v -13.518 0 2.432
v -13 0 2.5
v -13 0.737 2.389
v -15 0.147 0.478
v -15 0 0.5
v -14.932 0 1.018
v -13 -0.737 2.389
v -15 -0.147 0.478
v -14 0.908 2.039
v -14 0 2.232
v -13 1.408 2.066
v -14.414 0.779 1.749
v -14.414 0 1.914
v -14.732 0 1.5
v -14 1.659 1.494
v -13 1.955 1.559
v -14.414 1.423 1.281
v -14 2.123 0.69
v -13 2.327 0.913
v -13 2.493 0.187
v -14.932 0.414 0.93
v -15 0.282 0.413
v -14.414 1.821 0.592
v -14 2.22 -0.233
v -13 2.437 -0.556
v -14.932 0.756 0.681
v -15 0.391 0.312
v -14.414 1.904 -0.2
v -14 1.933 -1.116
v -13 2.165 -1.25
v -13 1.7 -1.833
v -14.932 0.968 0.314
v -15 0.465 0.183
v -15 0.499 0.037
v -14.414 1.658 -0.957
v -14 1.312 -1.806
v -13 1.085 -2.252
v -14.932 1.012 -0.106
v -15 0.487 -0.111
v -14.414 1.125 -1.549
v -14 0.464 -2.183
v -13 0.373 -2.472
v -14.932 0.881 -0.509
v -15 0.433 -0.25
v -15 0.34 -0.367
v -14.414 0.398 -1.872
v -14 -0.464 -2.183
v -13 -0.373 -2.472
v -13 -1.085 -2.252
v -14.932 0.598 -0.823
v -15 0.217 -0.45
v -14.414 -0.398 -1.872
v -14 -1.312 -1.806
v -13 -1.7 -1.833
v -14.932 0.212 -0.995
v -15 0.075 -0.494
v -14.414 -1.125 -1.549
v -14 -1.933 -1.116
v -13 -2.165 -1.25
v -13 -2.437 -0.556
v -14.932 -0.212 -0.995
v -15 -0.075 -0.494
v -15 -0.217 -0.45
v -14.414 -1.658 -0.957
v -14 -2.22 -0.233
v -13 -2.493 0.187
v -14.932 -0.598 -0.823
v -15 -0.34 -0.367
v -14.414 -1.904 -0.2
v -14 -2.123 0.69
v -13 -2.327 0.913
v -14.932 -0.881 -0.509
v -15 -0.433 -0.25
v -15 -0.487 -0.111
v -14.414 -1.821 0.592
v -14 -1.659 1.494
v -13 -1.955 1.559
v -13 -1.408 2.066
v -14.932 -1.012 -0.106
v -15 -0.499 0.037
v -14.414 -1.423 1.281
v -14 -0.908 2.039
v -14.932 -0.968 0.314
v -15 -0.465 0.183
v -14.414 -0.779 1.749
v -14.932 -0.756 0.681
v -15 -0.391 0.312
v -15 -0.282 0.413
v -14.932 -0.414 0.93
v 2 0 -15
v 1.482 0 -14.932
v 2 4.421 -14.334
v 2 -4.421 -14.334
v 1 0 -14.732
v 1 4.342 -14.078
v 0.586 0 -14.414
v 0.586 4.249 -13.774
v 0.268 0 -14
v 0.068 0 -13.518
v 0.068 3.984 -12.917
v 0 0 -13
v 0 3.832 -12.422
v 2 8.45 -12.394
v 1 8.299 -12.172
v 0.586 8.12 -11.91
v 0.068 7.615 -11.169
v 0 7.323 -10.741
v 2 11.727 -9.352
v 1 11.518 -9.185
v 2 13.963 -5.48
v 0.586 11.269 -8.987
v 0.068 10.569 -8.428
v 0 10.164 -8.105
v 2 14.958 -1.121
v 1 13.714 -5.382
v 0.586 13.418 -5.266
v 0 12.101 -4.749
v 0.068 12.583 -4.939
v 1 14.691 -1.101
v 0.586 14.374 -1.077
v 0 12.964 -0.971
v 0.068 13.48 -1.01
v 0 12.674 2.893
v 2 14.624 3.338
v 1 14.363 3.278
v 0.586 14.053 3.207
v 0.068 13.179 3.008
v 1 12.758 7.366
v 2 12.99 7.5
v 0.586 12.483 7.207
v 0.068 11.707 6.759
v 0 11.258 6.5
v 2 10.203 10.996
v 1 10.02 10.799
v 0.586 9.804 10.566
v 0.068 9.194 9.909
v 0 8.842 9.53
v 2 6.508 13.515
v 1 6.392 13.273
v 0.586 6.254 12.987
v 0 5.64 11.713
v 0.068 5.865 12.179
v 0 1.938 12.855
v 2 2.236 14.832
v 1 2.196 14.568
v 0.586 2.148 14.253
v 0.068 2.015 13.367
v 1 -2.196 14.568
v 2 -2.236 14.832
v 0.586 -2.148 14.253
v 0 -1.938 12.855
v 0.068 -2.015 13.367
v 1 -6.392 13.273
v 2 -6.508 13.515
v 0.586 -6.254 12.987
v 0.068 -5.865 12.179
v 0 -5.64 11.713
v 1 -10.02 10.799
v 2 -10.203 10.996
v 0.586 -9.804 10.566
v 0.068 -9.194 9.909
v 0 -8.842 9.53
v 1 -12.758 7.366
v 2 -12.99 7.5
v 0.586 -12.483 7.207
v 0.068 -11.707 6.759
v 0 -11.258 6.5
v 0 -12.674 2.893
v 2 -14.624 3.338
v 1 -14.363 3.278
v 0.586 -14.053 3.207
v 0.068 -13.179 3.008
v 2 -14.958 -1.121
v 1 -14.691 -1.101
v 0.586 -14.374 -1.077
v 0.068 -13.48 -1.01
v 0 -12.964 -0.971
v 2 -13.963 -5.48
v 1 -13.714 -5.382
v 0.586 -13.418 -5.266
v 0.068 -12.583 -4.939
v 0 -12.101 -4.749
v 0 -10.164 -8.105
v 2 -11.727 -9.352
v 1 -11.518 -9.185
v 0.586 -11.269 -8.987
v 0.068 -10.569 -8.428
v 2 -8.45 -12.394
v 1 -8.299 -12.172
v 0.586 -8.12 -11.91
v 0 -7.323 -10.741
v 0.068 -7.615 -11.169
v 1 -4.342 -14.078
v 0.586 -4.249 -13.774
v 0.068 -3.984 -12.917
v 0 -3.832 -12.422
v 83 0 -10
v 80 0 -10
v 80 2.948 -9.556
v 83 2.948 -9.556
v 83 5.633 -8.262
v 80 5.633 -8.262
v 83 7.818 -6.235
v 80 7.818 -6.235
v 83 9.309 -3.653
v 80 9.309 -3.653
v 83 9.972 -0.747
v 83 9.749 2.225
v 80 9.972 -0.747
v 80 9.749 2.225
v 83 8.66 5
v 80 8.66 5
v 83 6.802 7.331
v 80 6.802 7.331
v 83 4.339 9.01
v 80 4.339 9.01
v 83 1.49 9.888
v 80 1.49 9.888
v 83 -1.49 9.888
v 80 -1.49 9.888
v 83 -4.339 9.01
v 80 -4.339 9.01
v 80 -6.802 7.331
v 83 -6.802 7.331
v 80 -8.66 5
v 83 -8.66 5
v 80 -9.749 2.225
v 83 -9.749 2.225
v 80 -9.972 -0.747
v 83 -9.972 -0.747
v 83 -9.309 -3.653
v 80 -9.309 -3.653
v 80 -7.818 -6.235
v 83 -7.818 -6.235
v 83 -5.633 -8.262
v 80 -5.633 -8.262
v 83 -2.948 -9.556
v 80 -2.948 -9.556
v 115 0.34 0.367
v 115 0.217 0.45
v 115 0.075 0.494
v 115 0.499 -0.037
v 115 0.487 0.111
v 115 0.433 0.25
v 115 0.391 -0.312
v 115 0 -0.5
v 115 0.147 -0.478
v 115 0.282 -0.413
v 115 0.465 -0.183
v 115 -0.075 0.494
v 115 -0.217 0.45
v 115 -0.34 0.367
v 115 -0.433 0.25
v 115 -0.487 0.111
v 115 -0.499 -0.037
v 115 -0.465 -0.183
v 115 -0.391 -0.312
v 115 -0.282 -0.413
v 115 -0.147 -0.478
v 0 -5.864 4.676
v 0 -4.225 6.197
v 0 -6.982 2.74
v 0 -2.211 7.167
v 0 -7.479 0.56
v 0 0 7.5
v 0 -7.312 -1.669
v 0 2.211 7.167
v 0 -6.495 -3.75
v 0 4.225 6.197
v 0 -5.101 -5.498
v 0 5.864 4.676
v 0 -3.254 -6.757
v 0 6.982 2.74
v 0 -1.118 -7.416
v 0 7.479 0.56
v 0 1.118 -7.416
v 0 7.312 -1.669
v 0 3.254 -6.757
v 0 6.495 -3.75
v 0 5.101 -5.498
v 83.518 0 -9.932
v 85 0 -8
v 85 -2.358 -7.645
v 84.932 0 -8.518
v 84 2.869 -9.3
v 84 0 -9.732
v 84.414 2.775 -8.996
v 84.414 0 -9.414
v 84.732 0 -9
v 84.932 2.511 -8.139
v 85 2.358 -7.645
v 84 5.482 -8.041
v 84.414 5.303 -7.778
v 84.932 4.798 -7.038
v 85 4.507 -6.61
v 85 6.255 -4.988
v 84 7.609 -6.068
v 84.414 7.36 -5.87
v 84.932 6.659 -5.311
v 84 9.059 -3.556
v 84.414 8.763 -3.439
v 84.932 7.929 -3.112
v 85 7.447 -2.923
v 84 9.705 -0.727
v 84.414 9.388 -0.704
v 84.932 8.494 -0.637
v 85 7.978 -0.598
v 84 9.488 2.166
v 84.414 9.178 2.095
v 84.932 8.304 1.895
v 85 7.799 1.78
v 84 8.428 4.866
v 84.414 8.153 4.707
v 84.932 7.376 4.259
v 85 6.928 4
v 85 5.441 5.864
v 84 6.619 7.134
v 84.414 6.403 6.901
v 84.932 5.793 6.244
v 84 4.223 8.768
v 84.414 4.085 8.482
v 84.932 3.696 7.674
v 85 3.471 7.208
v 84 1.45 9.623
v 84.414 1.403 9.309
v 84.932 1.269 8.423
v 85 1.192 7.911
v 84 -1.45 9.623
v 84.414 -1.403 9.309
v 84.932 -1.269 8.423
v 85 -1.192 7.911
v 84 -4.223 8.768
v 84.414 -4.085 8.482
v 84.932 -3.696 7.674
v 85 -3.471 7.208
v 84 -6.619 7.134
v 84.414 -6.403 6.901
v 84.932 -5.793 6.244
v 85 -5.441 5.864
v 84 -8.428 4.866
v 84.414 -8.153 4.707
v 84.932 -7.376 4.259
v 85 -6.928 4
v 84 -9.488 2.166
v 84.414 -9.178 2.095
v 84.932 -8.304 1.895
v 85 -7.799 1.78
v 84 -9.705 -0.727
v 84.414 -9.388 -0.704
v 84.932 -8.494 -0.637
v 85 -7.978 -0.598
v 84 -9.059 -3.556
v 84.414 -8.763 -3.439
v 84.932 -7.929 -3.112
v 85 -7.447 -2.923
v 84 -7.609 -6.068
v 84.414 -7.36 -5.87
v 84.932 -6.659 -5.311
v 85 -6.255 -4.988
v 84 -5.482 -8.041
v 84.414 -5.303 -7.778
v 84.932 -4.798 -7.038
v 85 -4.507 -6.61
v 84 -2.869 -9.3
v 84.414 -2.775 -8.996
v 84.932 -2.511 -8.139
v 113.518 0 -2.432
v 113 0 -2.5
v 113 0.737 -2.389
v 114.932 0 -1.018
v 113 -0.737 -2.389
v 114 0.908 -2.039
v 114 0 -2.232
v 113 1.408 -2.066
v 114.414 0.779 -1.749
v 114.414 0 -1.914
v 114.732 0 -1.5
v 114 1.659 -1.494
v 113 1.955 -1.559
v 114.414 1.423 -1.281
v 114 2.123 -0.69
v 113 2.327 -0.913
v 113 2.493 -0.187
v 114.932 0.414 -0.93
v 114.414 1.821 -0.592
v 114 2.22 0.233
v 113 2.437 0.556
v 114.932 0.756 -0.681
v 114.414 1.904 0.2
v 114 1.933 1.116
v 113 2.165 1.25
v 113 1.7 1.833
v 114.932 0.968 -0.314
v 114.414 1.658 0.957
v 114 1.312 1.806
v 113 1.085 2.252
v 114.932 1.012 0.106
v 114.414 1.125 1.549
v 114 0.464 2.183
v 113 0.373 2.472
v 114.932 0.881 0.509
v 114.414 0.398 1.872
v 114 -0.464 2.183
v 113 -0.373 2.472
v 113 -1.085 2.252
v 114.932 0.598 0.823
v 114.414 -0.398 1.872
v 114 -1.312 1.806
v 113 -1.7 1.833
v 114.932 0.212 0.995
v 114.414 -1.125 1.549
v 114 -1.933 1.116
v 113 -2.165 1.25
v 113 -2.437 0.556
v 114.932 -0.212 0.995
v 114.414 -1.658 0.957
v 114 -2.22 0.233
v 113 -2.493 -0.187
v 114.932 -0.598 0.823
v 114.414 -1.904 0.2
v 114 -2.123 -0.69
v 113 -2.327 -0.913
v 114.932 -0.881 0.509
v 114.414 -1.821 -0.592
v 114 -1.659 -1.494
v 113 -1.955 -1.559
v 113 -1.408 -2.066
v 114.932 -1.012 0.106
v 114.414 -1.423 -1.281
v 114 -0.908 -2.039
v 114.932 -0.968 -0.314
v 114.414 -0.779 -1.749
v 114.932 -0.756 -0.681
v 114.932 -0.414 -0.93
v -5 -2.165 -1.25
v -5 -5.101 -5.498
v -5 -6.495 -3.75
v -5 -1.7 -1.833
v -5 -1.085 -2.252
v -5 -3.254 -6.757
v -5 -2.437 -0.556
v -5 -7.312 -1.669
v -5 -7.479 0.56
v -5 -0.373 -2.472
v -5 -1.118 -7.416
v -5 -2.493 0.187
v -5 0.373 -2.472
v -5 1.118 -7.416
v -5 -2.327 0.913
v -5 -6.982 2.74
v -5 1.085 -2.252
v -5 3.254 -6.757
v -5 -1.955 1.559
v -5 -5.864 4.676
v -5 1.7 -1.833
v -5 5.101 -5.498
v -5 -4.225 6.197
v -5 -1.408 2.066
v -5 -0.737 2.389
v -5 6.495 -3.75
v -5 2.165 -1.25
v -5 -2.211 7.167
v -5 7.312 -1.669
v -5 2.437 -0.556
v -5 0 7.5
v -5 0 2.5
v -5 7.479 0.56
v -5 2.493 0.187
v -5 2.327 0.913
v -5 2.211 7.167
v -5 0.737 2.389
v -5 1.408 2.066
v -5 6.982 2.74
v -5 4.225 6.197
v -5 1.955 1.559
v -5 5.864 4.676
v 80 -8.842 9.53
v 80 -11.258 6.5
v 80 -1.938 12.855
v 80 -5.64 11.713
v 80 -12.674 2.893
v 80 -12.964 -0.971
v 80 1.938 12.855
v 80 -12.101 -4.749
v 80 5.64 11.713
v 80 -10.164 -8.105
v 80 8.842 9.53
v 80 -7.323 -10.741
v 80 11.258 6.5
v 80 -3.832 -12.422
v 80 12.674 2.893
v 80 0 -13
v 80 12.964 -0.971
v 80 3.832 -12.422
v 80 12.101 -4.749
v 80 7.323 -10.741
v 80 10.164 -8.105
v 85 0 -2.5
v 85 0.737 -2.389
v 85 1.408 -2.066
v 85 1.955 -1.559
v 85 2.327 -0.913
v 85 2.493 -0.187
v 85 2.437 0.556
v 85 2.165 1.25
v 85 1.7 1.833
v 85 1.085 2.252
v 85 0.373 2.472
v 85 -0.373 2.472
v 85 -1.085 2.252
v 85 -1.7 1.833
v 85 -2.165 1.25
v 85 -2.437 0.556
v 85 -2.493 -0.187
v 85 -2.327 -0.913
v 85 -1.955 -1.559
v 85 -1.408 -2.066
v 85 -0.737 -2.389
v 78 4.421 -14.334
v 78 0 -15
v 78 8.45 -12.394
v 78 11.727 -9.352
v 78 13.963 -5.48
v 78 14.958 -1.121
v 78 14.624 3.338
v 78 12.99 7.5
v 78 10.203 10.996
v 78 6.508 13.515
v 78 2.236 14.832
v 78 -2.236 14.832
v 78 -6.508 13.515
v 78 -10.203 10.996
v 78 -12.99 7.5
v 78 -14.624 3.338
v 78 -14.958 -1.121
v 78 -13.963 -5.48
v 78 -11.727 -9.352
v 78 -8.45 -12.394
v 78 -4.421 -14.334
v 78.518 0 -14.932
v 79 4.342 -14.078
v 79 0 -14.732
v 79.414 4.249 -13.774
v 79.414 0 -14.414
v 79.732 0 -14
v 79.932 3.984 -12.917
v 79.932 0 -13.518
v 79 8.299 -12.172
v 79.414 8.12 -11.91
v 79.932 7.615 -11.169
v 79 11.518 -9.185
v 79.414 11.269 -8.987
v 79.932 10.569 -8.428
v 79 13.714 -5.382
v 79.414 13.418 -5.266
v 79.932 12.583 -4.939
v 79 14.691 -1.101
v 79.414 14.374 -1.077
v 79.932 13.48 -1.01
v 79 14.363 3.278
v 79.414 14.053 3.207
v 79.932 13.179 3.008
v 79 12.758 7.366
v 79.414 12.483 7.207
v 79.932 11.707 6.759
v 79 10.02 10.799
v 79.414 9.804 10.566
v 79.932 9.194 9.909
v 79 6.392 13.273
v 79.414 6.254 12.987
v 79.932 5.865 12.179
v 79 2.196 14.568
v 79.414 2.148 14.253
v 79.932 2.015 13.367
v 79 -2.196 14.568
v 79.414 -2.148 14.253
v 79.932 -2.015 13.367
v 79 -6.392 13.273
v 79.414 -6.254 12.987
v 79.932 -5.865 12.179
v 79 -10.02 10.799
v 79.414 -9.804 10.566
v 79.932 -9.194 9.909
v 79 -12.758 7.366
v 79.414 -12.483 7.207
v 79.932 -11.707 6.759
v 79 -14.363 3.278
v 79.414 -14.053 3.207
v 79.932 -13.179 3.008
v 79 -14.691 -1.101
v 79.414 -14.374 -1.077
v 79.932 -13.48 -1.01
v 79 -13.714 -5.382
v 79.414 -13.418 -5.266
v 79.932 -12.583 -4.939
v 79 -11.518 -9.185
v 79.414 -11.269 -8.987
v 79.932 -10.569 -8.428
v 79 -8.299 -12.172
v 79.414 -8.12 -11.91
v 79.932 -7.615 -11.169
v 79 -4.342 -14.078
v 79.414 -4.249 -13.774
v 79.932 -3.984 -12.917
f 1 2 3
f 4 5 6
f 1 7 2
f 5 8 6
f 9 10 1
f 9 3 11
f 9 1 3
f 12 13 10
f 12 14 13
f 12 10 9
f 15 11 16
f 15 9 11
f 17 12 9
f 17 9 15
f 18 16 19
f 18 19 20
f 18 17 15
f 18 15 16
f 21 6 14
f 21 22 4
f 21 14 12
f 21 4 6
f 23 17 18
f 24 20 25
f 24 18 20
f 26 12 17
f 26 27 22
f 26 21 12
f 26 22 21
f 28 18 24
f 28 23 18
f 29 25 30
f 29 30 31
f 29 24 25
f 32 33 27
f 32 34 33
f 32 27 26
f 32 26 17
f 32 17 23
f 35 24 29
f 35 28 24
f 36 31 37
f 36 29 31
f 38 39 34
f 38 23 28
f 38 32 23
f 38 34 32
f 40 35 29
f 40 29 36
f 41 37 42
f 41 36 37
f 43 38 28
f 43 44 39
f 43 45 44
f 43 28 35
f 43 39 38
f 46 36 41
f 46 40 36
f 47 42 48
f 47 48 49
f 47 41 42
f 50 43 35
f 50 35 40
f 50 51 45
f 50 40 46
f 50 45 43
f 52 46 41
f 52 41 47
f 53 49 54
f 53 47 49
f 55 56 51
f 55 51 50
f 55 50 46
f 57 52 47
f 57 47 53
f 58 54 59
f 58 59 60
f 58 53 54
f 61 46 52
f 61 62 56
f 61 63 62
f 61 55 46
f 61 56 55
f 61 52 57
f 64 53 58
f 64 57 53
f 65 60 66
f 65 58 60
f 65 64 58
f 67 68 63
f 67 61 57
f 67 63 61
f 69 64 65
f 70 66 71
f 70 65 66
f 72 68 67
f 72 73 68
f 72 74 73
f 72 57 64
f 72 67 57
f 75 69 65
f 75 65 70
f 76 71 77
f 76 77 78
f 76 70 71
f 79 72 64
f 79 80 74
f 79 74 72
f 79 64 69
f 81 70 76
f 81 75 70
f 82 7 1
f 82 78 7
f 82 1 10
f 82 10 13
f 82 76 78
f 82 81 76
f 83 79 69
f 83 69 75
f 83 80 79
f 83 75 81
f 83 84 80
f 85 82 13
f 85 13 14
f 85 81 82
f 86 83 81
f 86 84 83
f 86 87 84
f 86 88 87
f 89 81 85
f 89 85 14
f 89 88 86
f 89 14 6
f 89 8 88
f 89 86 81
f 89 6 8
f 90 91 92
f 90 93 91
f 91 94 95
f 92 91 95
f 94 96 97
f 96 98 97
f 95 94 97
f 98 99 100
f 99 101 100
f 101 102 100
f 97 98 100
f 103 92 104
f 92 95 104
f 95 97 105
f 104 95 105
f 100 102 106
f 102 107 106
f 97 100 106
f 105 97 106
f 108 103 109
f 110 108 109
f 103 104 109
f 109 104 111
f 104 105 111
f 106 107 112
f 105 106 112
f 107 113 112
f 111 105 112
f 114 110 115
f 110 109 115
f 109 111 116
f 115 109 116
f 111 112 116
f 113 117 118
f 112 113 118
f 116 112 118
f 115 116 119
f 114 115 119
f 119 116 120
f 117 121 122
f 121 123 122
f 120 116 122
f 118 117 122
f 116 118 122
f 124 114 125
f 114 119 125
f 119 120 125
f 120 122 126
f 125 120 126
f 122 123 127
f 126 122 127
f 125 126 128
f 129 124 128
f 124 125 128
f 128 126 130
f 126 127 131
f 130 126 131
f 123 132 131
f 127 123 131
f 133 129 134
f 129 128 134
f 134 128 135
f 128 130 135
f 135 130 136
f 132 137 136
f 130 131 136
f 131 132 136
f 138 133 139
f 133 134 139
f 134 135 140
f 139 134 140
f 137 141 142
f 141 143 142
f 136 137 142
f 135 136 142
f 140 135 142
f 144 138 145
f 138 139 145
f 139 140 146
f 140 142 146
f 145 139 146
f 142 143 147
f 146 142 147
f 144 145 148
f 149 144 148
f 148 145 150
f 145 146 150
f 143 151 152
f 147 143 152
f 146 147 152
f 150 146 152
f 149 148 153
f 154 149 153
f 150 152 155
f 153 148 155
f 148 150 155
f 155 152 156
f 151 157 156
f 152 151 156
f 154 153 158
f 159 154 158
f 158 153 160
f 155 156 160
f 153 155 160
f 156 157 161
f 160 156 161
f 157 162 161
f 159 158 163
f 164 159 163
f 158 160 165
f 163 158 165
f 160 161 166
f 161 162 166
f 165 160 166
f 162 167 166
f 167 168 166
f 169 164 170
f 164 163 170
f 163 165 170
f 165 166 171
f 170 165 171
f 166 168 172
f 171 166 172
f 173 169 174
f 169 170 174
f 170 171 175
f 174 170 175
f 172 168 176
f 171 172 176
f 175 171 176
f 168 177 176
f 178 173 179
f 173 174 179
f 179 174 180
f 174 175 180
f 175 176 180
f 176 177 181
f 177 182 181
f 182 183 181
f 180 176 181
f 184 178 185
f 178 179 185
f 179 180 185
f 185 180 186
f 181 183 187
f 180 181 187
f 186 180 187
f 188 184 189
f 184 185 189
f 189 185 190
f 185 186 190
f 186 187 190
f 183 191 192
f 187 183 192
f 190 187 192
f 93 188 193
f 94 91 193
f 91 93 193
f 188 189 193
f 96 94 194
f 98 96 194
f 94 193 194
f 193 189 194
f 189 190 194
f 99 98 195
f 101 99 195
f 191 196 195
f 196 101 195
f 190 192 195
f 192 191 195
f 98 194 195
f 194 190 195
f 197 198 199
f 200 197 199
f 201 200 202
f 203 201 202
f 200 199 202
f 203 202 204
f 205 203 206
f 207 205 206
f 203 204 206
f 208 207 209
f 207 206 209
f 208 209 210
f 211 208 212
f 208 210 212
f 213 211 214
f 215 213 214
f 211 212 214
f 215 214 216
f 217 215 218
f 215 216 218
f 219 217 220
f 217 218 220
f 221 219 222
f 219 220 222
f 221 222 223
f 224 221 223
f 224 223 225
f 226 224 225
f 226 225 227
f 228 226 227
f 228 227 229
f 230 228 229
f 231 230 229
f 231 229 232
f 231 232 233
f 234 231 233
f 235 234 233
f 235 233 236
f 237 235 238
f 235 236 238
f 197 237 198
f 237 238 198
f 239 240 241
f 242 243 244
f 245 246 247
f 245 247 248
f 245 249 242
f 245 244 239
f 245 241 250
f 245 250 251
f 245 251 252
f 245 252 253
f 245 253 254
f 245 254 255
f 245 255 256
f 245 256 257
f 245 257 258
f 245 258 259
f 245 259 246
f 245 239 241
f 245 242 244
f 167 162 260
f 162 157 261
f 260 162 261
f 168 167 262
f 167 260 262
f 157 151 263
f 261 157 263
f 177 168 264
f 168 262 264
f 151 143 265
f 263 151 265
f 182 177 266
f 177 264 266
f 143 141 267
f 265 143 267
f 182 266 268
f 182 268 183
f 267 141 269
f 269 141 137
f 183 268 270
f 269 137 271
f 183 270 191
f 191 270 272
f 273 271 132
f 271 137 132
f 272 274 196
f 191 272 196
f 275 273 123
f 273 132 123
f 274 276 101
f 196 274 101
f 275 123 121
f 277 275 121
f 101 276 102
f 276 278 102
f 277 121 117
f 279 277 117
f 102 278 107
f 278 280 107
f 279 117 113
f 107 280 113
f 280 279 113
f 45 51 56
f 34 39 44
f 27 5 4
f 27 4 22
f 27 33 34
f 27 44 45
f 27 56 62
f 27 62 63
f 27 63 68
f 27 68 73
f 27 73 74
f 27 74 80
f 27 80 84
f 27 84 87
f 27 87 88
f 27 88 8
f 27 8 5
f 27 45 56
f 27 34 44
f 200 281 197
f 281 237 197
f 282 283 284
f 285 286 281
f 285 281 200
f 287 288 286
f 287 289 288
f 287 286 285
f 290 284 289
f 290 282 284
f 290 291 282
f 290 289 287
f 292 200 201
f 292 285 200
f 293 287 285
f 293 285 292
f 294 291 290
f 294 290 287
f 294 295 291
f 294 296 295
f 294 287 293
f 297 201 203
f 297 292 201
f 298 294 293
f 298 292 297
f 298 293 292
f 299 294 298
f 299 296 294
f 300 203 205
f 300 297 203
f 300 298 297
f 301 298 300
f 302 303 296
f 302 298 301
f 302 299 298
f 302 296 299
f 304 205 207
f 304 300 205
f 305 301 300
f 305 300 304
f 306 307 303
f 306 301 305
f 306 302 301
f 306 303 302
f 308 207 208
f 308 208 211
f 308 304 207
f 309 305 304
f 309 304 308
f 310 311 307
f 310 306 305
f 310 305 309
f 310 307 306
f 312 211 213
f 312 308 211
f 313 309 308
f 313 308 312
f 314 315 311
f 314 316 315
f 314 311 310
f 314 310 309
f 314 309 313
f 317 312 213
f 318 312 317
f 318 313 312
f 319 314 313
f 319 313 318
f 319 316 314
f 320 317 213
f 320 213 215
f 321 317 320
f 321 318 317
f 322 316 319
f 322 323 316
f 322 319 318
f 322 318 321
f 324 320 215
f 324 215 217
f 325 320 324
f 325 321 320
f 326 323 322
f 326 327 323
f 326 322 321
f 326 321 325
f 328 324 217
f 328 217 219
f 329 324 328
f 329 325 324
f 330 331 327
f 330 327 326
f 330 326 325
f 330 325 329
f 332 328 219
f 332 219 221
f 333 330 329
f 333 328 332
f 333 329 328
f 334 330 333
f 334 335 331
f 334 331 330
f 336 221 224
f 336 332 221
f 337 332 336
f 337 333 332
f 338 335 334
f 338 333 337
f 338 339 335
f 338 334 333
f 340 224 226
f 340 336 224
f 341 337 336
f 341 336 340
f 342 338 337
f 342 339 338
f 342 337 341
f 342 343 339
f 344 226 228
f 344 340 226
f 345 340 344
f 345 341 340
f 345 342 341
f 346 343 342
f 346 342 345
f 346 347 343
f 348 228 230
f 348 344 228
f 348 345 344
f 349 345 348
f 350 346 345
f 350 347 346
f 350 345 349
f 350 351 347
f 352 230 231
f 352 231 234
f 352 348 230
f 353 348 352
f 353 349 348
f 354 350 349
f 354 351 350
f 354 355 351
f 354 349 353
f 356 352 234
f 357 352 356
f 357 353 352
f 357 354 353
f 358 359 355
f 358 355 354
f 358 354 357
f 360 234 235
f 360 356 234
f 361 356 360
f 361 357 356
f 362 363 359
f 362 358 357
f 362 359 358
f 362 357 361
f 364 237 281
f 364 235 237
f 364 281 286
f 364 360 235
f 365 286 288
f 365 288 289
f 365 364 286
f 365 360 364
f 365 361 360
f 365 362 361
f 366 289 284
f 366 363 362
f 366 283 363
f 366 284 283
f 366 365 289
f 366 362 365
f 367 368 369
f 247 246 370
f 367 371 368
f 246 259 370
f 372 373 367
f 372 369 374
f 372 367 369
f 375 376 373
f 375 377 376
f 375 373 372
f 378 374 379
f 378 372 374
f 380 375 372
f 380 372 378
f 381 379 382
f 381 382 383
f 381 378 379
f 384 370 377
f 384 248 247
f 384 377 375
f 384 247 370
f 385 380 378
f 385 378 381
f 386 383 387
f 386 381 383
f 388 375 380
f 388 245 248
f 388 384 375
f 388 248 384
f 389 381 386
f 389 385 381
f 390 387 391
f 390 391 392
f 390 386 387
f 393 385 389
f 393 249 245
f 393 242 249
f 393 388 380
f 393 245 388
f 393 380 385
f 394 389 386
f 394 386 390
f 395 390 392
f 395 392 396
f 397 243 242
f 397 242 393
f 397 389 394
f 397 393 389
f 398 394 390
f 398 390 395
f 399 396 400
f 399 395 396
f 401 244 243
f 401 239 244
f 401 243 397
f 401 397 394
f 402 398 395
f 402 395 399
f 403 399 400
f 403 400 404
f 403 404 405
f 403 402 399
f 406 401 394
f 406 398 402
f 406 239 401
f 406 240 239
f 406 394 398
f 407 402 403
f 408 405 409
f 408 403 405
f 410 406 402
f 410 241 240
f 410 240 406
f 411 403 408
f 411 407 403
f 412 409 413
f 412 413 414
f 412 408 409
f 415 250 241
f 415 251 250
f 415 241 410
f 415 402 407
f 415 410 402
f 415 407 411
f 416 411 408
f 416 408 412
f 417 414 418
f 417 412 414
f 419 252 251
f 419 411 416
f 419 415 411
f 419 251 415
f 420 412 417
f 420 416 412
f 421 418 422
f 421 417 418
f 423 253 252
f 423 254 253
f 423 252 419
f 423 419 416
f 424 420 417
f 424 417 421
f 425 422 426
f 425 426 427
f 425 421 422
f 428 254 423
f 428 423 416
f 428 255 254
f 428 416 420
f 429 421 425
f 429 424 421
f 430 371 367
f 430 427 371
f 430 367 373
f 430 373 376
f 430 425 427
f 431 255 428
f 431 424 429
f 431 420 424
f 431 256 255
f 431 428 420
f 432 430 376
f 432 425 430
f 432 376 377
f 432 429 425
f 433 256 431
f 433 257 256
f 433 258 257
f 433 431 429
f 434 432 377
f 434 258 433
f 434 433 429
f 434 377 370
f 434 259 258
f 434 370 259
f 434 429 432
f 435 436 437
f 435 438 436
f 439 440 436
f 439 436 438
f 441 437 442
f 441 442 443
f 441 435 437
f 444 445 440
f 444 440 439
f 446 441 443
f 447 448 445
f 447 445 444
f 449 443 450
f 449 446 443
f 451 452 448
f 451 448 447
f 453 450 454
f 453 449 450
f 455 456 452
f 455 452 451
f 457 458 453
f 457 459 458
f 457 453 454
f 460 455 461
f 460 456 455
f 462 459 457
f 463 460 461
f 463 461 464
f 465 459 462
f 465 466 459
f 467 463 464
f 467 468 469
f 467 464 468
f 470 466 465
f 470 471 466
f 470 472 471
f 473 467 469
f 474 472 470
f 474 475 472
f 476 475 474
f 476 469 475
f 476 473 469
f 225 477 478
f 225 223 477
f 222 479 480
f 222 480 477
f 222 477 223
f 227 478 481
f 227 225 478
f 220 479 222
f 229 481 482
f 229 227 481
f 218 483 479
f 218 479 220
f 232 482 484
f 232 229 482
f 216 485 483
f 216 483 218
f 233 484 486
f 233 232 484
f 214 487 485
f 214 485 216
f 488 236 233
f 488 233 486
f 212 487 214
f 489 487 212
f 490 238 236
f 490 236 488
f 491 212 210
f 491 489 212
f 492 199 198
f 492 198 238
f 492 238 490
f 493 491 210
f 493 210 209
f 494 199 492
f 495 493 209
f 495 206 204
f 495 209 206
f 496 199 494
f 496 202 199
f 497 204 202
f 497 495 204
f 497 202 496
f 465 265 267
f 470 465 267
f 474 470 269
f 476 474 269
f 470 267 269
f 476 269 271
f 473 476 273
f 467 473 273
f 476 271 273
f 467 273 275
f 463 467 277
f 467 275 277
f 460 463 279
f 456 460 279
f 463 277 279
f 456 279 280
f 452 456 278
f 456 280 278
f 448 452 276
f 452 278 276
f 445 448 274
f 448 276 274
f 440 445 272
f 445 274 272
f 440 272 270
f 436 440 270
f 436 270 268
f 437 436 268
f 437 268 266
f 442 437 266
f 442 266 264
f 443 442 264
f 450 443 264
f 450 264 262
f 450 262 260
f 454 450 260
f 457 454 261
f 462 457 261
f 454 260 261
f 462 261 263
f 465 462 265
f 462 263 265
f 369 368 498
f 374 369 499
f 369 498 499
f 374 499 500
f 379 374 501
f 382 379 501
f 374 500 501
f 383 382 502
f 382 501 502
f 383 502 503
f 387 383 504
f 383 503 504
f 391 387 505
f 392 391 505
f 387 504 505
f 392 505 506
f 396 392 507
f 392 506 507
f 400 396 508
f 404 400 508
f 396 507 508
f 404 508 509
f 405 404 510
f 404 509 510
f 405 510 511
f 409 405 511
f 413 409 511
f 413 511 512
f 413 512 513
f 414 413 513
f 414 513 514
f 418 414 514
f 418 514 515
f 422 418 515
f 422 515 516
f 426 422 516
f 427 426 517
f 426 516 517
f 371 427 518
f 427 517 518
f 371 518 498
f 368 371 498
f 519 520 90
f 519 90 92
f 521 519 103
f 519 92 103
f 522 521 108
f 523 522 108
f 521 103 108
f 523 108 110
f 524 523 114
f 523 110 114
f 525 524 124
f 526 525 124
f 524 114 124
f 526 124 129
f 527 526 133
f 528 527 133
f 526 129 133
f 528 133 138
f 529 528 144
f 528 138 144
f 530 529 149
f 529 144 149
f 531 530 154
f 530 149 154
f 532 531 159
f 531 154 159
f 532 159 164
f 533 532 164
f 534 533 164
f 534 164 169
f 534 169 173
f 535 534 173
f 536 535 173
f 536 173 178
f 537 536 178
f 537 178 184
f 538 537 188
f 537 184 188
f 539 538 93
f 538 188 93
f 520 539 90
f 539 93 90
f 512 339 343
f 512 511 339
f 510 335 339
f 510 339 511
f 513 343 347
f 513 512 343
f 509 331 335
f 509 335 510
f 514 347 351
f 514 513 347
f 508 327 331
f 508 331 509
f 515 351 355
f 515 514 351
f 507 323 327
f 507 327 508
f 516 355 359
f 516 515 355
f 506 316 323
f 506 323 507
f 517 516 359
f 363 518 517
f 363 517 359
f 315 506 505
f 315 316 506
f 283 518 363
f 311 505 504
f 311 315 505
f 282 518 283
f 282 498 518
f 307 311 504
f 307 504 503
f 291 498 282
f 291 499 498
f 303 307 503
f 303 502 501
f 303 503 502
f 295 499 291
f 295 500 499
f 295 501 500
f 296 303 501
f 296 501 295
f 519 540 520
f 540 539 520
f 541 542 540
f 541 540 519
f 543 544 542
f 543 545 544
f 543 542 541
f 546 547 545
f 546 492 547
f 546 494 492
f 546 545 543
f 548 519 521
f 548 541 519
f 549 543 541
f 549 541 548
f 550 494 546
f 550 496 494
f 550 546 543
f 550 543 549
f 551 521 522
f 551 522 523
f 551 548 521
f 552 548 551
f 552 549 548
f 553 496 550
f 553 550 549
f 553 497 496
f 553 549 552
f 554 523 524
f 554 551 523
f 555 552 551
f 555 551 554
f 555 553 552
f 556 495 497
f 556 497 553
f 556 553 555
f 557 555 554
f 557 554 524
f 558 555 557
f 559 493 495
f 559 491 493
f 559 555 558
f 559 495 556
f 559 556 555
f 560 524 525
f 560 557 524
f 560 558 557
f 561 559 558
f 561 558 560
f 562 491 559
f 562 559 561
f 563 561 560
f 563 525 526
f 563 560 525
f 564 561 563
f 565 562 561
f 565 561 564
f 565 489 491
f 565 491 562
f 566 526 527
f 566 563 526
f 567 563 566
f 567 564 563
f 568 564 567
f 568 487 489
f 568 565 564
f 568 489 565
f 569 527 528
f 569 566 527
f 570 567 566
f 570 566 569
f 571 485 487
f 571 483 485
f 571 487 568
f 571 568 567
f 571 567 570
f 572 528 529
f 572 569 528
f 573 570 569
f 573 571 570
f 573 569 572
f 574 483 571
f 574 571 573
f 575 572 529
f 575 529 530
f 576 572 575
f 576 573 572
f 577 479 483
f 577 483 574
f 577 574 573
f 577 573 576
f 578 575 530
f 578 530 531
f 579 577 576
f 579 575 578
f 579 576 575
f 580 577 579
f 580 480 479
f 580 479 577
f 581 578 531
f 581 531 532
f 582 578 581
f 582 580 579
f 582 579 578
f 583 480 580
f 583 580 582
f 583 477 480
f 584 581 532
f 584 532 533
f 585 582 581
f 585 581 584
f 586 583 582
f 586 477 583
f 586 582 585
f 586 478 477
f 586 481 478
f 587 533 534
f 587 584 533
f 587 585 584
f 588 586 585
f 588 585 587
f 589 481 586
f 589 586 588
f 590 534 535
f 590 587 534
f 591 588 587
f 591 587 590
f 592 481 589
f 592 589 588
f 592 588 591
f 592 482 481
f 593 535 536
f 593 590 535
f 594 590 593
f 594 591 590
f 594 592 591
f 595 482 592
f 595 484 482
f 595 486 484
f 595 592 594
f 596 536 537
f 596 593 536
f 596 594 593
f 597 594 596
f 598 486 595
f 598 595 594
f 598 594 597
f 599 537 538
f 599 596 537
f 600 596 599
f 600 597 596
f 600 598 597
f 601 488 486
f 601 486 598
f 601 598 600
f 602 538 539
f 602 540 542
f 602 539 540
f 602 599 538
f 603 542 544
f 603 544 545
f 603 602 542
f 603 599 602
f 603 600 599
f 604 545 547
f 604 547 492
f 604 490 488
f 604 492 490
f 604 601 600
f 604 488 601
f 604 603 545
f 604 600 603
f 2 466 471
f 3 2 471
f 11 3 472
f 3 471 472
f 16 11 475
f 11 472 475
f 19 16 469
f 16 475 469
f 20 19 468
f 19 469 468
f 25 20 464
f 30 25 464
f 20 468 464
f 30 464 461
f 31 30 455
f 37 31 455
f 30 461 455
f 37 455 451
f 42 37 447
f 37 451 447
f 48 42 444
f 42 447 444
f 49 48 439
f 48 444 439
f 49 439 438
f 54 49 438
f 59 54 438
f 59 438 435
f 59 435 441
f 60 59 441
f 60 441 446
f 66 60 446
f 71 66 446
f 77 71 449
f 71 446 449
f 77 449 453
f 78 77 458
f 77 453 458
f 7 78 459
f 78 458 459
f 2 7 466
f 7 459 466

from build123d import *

# Parameters (mm, degrees)
SKETCH1_R           = 15
BOSS_EXTRUDE1_DEPTH = 80
SKETCH2_R           = 10
BOSS_EXTRUDE2_DEPTH = 5
SKETCH3_R           = 2.5
BOSS_EXTRUDE3_DEPTH = 30
FILLET1_R           = 2
FILLET2_R           = 2
FILLET3_R           = 2
SKETCH4_R           = 7.5
BOSS_EXTRUDE5_DEPTH = 5
SKETCH5_R           = 2.5
BOSS_EXTRUDE6_DEPTH = 10
FILLET4_R           = 2


with BuildPart() as part:
    # Sketch1 → Boss-Extrude1 (new body)
    with BuildSketch(Plane(origin=(0, 0, 0), x_dir=(0, 0, -1), z_dir=(1, 0, 0))):
        Circle(SKETCH1_R)
    extrude(amount=BOSS_EXTRUDE1_DEPTH)

    # Sketch2 → Boss-Extrude2 (add)
    with BuildSketch(Plane(origin=(80, 0, 0), x_dir=(0, 0, -1), z_dir=(1, 0, 0))):
        Circle(SKETCH2_R)
    extrude(amount=BOSS_EXTRUDE2_DEPTH)

    # Sketch3 → Boss-Extrude3 (add)
    with BuildSketch(Plane(origin=(85, 0, 0), x_dir=(0, 0, -1), z_dir=(1, 0, 0))):
        Circle(SKETCH3_R)
    extrude(amount=BOSS_EXTRUDE3_DEPTH)

    # Fillet1
    fillet1_edges = [part.edges().sort_by_distance(p)[0] for p in [
        (80, 0, 15),
    ]]
    fillet(fillet1_edges, radius=FILLET1_R)

    # Fillet2
    fillet2_edges = [part.edges().sort_by_distance(p)[0] for p in [
        (85, 0, 10),
    ]]
    fillet(fillet2_edges, radius=FILLET2_R)

    # Fillet3
    fillet3_edges = [part.edges().sort_by_distance(p)[0] for p in [
        (0, 0, 15),
    ]]
    fillet(fillet3_edges, radius=FILLET3_R)

    # Sketch4 → Boss-Extrude5 (add)
    with BuildSketch(Plane.ZY):
        Circle(SKETCH4_R)
    extrude(amount=BOSS_EXTRUDE5_DEPTH)

    # Sketch5 → Boss-Extrude6 (add)
    with BuildSketch(Plane.ZY.offset(5)):
        Circle(SKETCH5_R)
    extrude(amount=BOSS_EXTRUDE6_DEPTH)

    # Fillet4
    fillet4_edges = [part.edges().sort_by_distance(p)[0] for p in [
        (115, 0, 2.5),
        (-15, 0, -2.5),
    ]]
    fillet(fillet4_edges, radius=FILLET4_R)


solid = part.part
